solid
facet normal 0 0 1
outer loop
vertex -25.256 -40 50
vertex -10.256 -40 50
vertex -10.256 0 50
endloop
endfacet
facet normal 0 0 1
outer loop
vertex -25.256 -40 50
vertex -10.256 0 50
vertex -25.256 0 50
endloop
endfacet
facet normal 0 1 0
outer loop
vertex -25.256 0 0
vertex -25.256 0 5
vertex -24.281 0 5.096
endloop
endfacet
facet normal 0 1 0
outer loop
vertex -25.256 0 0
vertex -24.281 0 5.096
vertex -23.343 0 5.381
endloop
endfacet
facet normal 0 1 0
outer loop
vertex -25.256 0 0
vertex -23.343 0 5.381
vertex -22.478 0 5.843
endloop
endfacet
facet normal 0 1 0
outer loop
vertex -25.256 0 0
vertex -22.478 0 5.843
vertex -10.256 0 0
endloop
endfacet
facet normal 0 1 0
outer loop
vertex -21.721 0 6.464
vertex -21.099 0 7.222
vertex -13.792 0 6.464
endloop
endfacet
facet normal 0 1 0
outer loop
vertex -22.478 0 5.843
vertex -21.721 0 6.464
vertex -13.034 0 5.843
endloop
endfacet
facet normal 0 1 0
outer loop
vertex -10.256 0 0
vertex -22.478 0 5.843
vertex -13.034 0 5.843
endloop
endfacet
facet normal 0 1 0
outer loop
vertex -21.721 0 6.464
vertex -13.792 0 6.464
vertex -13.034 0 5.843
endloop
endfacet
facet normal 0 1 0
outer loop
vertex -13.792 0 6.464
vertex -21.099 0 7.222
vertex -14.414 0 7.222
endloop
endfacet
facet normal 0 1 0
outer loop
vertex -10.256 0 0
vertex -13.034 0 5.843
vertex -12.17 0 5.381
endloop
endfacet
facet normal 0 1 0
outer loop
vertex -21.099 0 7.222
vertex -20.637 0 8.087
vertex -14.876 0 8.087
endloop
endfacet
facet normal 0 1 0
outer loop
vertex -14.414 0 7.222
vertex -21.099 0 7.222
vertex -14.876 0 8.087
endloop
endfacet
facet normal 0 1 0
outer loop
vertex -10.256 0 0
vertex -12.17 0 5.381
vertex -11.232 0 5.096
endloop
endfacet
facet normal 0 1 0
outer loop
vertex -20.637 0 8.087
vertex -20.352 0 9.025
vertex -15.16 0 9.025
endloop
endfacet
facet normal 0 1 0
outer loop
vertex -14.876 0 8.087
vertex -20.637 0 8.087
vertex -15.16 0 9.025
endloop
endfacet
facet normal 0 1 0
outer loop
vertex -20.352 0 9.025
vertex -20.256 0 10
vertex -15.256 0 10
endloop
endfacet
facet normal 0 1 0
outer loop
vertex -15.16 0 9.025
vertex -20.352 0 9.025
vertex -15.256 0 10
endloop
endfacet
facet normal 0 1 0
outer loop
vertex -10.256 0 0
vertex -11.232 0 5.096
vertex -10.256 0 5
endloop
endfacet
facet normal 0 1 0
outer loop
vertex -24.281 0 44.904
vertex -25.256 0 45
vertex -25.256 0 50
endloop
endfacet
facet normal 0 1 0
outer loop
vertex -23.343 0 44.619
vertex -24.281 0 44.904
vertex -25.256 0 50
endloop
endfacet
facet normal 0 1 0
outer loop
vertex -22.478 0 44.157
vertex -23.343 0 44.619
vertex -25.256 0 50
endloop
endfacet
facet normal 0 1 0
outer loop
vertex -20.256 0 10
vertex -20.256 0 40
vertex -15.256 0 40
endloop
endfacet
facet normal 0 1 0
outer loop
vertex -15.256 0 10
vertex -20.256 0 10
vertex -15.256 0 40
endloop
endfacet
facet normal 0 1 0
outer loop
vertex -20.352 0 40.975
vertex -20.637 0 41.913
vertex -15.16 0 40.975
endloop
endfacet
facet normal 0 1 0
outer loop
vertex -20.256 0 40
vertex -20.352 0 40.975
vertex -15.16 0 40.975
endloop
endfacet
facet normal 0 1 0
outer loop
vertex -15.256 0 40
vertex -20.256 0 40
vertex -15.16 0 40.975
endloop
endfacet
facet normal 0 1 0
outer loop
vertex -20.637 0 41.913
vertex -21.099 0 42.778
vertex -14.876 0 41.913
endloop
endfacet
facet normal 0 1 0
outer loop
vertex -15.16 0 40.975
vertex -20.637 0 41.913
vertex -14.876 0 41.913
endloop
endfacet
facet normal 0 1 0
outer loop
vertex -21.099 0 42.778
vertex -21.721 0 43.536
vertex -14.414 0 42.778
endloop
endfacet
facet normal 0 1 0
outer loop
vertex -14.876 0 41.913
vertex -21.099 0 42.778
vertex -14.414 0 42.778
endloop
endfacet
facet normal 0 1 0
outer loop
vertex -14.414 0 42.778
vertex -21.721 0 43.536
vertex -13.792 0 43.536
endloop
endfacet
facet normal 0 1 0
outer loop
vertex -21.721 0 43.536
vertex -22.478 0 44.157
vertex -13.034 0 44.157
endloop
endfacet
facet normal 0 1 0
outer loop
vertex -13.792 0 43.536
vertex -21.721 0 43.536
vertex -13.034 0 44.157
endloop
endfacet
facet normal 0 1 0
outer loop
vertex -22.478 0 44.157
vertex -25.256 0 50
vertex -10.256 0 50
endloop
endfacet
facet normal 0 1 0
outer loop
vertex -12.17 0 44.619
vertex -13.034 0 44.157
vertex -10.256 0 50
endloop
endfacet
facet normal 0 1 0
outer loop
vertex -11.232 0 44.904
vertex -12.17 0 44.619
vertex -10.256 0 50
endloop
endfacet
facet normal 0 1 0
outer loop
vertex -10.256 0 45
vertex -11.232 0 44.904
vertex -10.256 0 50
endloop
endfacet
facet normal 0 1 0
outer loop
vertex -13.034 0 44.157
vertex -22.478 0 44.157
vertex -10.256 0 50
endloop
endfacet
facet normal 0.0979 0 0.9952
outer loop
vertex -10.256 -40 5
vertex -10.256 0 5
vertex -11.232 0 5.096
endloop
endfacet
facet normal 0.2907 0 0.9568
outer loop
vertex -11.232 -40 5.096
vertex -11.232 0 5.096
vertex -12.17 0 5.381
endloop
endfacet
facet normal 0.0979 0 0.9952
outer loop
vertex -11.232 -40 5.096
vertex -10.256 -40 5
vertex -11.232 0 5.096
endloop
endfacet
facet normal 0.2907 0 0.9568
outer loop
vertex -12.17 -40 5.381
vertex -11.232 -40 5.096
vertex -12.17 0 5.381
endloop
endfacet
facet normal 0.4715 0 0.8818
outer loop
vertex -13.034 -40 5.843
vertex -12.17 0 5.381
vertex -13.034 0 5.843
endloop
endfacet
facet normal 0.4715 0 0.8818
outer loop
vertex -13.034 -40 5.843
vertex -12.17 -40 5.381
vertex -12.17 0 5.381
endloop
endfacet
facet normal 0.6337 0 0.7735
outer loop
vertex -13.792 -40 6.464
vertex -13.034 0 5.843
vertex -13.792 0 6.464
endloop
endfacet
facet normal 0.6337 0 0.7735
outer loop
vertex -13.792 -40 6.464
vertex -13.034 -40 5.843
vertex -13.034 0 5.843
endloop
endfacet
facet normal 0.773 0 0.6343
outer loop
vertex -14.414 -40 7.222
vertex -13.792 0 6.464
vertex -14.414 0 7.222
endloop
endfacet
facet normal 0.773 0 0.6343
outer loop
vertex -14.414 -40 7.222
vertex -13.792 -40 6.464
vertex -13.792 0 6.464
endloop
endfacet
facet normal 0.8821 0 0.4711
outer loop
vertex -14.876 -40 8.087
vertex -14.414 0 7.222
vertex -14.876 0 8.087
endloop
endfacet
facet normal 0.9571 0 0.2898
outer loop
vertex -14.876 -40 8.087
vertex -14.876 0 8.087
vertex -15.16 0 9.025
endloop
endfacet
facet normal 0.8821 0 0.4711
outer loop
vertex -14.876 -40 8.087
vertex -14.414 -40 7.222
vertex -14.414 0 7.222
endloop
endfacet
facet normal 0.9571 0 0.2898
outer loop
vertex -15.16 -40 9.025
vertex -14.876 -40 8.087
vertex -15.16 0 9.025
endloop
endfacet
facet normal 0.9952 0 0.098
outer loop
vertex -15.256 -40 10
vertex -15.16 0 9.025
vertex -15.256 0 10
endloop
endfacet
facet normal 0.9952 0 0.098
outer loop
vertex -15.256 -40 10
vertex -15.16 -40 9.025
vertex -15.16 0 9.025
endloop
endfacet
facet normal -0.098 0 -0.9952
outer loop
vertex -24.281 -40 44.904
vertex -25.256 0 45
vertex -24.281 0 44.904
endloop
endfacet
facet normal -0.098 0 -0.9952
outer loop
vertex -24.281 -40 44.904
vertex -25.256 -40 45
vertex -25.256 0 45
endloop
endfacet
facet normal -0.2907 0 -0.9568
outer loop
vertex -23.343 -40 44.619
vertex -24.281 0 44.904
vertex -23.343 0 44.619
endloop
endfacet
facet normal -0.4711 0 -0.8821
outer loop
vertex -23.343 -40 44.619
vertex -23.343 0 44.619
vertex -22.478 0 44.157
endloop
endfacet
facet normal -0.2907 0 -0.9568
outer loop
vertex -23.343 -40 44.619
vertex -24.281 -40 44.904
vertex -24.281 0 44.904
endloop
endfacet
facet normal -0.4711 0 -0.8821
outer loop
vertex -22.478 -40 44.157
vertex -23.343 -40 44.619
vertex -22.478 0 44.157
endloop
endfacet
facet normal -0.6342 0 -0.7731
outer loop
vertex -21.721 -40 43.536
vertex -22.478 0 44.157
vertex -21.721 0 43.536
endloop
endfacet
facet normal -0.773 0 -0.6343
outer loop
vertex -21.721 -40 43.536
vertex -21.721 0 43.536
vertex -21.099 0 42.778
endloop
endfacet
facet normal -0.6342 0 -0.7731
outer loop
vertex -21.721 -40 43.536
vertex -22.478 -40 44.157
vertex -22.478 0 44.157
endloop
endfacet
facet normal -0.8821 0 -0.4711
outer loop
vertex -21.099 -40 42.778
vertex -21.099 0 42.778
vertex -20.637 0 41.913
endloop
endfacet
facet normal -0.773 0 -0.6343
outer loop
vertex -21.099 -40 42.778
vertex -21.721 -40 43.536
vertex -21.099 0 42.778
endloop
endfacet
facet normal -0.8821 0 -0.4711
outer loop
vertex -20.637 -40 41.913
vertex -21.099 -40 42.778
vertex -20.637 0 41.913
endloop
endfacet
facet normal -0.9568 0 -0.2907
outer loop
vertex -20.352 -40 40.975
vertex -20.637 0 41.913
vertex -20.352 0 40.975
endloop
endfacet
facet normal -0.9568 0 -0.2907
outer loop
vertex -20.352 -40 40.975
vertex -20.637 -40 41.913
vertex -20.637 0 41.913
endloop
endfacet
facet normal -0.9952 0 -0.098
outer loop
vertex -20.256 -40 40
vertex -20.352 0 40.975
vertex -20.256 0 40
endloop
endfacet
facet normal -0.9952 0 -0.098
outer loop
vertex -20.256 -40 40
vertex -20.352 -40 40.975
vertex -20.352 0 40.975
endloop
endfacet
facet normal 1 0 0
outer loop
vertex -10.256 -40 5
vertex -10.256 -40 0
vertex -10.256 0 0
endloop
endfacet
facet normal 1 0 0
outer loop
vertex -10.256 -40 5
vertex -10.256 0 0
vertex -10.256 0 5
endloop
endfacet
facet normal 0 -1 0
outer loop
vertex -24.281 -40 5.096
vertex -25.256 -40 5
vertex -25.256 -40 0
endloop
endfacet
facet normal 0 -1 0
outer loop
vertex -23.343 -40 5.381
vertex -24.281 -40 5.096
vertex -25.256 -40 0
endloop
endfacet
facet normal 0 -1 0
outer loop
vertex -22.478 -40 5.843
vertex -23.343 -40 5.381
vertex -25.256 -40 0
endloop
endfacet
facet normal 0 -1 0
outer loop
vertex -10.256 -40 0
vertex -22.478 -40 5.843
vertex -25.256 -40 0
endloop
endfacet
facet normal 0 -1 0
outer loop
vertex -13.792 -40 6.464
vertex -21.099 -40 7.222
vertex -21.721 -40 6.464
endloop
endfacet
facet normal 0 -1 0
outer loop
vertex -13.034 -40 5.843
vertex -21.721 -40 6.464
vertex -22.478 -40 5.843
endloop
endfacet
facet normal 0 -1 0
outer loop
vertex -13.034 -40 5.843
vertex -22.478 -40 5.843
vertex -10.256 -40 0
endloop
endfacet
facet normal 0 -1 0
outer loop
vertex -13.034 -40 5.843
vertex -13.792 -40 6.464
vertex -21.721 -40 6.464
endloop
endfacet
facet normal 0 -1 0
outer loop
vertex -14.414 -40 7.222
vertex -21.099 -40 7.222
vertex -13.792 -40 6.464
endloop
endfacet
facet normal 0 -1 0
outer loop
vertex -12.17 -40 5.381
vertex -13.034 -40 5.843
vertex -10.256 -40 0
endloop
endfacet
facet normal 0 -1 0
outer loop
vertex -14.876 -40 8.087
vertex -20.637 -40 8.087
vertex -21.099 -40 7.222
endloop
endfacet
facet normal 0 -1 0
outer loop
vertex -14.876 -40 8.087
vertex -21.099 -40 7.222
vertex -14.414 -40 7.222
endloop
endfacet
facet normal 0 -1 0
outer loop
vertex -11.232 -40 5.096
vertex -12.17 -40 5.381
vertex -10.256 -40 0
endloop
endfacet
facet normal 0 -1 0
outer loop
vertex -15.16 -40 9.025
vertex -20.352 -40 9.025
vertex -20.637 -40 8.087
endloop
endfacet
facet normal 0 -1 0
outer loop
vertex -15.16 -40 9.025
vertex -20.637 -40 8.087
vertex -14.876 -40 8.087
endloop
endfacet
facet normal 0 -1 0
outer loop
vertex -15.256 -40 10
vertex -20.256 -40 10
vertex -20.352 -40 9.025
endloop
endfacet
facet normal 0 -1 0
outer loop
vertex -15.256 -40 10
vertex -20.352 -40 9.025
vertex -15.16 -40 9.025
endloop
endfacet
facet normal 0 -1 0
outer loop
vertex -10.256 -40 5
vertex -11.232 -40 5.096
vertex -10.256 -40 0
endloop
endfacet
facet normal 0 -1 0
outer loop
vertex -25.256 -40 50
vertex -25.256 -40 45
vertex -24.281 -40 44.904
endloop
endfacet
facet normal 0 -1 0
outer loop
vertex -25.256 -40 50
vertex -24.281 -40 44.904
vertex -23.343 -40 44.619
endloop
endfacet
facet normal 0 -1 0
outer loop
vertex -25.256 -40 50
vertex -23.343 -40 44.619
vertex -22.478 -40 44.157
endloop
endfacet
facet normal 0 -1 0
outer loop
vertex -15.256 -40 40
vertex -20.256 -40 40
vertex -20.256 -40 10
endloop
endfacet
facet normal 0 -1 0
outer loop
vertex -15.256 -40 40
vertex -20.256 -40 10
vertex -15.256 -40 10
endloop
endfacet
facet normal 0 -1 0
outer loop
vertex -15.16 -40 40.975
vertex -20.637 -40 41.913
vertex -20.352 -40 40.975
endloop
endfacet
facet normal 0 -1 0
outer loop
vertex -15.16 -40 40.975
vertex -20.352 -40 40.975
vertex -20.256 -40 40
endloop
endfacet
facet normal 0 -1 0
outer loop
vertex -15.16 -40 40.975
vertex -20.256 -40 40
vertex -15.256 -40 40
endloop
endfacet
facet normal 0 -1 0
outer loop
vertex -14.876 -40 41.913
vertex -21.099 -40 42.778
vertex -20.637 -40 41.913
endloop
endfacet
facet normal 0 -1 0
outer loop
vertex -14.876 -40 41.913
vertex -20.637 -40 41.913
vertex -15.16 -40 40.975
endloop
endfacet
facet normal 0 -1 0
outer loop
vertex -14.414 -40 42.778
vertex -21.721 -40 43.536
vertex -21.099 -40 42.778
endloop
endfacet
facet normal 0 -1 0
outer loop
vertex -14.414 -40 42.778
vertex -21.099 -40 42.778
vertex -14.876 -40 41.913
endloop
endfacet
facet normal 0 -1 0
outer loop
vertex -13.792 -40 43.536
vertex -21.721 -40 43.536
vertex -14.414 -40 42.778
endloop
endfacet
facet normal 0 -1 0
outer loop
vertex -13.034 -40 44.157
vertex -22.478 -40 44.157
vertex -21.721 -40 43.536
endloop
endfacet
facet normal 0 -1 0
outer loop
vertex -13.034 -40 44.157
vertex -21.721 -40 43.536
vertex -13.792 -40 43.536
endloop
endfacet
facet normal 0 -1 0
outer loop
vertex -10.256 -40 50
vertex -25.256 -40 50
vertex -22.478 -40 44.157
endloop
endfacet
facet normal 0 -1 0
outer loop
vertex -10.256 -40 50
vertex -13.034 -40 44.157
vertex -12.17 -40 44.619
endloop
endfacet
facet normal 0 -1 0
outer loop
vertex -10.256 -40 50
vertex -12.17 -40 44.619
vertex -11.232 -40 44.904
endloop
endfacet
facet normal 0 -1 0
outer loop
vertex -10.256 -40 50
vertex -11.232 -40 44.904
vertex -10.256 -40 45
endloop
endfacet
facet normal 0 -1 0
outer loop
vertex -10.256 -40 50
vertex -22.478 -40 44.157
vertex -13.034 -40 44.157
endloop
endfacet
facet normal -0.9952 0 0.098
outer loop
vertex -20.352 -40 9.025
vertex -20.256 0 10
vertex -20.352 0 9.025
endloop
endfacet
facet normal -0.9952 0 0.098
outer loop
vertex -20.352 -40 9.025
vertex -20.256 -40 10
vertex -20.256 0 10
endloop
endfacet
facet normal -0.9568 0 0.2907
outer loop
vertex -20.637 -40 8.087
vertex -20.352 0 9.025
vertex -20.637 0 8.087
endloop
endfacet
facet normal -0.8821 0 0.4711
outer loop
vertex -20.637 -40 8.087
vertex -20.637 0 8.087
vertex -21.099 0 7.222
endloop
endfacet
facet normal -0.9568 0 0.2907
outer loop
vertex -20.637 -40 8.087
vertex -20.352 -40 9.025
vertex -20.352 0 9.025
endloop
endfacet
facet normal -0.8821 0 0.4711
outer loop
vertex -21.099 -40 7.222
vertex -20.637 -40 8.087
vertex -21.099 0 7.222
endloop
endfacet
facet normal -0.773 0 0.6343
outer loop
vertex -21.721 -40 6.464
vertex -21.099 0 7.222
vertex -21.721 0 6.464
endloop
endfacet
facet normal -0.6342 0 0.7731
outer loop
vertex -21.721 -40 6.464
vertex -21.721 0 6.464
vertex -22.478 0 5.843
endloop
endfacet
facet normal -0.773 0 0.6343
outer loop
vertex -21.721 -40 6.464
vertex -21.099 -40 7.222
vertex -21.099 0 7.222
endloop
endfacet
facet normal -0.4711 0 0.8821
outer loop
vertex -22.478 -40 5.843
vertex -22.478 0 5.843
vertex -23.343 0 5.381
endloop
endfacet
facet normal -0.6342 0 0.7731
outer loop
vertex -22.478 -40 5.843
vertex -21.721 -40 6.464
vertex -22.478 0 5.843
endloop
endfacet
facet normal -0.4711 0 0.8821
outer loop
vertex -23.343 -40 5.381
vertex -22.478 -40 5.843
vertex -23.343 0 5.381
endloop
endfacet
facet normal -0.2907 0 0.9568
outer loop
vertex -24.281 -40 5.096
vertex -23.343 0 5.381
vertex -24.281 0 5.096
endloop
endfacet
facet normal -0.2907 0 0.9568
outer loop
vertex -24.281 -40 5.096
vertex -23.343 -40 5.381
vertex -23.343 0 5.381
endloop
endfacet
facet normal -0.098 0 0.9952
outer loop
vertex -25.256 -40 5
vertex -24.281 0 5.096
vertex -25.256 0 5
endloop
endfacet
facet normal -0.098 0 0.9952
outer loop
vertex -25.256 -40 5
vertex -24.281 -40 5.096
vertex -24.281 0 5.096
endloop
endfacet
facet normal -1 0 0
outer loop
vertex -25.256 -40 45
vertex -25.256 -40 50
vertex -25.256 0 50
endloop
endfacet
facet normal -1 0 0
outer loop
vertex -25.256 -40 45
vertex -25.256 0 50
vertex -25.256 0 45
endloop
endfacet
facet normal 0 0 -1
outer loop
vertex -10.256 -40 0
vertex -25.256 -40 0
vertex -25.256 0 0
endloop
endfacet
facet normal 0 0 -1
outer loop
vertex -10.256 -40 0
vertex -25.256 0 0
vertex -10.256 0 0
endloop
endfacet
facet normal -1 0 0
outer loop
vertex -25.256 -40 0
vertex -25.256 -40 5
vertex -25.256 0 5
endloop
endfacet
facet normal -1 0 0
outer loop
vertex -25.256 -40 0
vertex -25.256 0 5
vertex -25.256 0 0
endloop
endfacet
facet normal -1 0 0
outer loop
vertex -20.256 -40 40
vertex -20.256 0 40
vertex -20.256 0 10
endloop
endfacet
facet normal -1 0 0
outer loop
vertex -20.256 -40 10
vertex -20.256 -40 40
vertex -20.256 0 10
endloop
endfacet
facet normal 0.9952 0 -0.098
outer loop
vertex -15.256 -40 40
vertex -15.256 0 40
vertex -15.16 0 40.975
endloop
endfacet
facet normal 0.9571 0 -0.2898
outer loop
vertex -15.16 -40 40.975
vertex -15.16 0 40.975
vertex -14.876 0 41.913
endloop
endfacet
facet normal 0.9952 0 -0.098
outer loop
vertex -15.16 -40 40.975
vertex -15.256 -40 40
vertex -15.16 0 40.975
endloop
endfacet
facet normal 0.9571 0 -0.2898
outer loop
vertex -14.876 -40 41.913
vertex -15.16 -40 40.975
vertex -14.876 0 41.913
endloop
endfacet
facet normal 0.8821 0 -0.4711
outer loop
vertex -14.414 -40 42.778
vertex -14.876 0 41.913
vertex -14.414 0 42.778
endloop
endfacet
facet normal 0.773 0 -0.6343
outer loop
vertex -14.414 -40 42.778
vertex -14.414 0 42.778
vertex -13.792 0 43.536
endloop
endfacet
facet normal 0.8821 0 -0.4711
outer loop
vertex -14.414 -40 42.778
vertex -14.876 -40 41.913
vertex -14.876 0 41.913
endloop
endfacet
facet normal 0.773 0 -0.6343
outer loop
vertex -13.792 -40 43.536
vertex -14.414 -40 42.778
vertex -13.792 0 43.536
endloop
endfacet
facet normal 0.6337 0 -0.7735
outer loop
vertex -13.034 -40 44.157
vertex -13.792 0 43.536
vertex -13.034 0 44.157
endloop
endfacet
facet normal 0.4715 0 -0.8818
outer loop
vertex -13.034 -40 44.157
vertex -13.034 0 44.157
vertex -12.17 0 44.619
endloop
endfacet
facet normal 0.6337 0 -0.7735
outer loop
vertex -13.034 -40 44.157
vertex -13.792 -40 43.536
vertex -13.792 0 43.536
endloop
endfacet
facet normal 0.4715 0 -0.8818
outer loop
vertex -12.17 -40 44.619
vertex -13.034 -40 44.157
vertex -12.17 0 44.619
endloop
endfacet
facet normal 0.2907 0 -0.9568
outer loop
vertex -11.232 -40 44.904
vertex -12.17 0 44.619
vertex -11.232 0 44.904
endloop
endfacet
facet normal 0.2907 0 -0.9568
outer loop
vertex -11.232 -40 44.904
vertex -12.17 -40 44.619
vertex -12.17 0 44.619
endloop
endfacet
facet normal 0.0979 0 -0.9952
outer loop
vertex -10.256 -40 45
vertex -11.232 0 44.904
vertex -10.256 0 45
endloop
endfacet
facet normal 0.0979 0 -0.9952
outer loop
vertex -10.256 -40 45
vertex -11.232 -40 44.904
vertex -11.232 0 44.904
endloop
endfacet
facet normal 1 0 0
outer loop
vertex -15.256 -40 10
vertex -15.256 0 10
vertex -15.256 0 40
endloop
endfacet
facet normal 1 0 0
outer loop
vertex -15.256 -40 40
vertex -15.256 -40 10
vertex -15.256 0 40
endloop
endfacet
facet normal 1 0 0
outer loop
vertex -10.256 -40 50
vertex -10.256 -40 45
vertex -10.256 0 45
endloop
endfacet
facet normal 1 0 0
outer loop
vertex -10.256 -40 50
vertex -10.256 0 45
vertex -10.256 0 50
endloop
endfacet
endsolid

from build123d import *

# Parameters (mm, degrees)
F1_DEPTH = 40
F2_R     = 4.99999


# Not quite as in the source:
# - a fillet or chamfer is up to 0.001 mm smaller than in the source, because OpenCascade refuses the exact size


with BuildPart() as f1:
    # F0 (on Front) → F1 (new body)
    with BuildSketch(Plane.XZ):
        Polygon((-10.2562157065, 50), (-25.2562157065, 50), (-25.2562157065, 45), (-20.2562157065, 45), (-20.2562157065, 5), (-25.2562157065, 5), (-25.2562157065, 0), (-10.2562157065, 0), (-10.2562157065, 5), (-15.2562157065, 5), (-15.2562157065, 45), (-10.2562157065, 45), align=None)
    extrude(amount=F1_DEPTH)

    # F2 (radius 5 in the source; OpenCascade refuses exactly that, so slightly less here)
    f2_edges = [f1.edges().sort_by_distance(p)[0] for p in [
        (-15.256216, -20, 5),
        (-20.256216, -20, 5),
        (-15.256216, -20, 45),
        (-20.256216, -20, 45),
    ]]
    fillet(f2_edges, radius=F2_R)


solid = f1.part
